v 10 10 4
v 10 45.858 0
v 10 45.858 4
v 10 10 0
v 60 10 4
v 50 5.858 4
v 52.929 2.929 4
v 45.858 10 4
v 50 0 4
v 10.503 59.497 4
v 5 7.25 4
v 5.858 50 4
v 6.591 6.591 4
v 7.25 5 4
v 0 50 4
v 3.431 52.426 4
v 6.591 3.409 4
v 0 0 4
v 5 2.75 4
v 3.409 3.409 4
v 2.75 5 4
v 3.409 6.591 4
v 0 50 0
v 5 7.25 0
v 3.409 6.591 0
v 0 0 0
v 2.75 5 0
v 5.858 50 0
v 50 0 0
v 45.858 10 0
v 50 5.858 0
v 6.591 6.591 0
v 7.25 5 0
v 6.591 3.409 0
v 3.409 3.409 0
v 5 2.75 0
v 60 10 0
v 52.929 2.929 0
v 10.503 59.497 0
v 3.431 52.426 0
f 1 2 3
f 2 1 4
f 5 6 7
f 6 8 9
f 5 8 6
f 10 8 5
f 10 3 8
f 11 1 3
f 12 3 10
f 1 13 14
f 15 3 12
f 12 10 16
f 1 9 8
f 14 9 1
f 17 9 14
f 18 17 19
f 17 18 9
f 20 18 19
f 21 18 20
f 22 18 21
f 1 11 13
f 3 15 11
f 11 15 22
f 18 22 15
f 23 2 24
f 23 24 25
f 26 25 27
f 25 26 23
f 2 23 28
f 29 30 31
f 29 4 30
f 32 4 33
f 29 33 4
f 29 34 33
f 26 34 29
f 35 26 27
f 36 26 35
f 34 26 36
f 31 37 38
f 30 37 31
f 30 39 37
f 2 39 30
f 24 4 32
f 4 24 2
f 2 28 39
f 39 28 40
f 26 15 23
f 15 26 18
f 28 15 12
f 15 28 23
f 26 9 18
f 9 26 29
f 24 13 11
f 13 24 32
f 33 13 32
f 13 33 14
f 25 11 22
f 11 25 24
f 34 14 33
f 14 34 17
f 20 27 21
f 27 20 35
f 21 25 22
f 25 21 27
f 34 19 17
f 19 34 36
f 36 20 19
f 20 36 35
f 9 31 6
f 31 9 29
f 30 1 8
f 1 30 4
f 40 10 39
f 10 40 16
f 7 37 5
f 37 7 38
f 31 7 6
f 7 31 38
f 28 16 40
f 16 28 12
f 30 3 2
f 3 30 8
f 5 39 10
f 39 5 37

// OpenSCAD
difference(){
cube([10,50,4]);
translate([5,5,0])cylinder(d=4.5,h=11,center=true);}

translate([10,0,0])cube([40,10,4]);
translate([60,10,0])rotate([0,0,135])cube([70,10,4]);
